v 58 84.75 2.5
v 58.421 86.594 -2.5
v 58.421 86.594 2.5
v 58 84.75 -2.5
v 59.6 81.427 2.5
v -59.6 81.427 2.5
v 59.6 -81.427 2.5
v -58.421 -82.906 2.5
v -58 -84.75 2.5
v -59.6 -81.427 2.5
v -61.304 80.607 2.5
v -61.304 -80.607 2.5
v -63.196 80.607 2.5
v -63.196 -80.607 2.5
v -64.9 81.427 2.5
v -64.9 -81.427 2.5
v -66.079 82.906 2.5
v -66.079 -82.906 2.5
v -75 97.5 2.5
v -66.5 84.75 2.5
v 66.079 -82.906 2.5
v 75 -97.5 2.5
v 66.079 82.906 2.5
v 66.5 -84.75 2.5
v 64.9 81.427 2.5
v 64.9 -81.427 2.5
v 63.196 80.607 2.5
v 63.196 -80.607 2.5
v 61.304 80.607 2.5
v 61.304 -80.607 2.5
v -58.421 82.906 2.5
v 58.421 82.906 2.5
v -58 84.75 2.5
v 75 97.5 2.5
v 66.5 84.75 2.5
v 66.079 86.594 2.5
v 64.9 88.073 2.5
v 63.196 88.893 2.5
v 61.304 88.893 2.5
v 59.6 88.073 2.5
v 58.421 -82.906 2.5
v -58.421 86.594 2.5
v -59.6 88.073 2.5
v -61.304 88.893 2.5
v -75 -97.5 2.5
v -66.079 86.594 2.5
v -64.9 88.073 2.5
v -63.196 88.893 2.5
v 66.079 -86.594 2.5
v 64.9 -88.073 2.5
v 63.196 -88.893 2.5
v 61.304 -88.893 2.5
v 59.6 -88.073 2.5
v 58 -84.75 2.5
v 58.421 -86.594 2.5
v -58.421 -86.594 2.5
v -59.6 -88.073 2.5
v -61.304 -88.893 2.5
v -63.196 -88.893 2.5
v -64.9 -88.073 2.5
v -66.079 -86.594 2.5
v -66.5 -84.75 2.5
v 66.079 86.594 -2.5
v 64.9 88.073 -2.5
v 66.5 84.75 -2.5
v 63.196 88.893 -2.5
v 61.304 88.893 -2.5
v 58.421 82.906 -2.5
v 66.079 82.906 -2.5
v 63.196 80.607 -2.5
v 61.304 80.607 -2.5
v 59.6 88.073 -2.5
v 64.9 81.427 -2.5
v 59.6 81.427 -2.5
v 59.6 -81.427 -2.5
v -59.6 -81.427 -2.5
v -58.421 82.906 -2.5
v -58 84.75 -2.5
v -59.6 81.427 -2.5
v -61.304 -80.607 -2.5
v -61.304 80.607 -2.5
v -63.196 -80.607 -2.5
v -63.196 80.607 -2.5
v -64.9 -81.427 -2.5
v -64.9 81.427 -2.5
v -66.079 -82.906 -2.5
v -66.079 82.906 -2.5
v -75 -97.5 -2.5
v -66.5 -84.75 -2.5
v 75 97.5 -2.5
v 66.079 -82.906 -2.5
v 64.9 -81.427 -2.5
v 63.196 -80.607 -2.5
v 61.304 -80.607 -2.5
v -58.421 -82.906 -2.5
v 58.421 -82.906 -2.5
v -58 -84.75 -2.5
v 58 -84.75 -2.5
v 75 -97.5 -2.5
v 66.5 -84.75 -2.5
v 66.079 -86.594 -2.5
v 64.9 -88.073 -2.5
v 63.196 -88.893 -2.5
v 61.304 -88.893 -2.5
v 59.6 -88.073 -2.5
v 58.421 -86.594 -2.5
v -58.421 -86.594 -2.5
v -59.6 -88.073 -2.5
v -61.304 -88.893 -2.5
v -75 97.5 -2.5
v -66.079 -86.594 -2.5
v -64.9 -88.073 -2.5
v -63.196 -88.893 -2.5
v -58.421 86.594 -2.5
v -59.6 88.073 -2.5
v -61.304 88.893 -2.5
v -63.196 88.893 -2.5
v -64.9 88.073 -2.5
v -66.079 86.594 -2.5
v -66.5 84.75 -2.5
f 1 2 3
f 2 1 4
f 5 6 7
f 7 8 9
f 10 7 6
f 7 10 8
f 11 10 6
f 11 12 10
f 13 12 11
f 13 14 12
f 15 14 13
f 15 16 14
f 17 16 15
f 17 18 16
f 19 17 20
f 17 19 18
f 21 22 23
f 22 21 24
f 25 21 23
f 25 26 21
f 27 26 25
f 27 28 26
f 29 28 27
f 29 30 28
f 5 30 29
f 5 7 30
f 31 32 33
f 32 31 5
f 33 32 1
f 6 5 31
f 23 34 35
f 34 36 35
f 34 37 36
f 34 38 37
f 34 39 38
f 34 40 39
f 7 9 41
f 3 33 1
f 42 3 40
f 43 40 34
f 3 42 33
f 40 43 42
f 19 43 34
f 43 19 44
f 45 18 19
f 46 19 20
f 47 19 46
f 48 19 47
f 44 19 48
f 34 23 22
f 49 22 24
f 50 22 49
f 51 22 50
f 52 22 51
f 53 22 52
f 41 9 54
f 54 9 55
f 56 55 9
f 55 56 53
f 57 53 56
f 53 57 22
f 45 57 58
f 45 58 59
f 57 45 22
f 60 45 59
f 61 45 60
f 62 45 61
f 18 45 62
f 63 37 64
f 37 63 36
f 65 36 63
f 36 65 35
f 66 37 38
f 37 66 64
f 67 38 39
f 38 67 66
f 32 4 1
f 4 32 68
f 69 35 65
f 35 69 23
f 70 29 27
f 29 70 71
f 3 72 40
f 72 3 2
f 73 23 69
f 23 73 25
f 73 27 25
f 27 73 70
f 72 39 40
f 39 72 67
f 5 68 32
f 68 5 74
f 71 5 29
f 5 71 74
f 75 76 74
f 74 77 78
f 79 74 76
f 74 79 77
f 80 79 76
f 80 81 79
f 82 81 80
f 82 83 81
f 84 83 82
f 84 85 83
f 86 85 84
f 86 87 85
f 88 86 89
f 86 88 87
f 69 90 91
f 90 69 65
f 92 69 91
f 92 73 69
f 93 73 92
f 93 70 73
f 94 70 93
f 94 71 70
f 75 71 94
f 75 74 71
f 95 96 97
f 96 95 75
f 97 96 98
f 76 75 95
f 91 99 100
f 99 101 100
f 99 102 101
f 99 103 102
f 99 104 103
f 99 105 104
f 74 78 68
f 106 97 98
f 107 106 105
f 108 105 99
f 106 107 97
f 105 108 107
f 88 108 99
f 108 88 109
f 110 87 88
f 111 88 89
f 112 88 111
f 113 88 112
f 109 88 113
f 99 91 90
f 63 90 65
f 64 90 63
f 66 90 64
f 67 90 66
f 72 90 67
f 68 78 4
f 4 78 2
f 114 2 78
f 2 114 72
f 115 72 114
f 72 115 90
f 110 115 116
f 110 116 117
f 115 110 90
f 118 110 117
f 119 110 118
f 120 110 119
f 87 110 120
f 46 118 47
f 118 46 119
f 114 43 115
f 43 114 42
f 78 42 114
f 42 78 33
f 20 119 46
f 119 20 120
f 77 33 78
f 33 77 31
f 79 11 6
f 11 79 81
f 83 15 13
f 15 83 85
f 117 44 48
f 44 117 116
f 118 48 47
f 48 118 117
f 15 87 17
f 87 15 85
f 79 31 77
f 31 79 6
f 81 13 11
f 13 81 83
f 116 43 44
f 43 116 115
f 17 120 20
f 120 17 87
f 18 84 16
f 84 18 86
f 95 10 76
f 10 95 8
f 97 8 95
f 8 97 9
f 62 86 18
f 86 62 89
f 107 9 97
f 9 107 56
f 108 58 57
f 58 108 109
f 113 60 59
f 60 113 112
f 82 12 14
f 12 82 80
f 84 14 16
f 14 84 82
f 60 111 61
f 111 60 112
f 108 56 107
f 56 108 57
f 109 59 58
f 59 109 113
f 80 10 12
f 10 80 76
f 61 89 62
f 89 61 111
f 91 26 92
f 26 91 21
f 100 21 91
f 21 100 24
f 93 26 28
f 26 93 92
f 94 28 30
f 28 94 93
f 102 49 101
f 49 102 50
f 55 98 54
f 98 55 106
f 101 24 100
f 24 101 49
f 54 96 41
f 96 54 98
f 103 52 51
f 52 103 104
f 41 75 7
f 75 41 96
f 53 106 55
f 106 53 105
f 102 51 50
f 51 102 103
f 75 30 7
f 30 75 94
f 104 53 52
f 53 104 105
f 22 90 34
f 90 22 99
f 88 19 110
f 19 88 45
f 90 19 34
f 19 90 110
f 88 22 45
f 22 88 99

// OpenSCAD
// Generated by SolidPython 1.1.3 on 2024-01-11 21:47:16


difference() {
	cube(center = true, size = [150, 195.0000000000, 5]);
	union() {
		translate(v = [62.2500000000, 84.7500000000]) {
			cylinder(center = true, h = 5, r = 4.2500000000);
		}
		translate(v = [-62.2500000000, 84.7500000000]) {
			cylinder(center = true, h = 5, r = 4.2500000000);
		}
		translate(v = [-62.2500000000, -84.7500000000]) {
			cylinder(center = true, h = 5, r = 4.2500000000);
		}
		translate(v = [62.2500000000, -84.7500000000]) {
			cylinder(center = true, h = 5, r = 4.2500000000);
		}
	}
}
/***********************************************
*********      SolidPython code:      **********
************************************************
 
import solid
import numpy as np
import numbers
import pudb
from solid.utils import *
import viewscad
import subprocess
import os
import os.path as osp
import math
import sys

chamfer_extrude=solid.import_scad("./chamfer_extrude.scad")
chamfer_extrude=chamfer_extrude.chamfer_extrude
r = viewscad.Renderer(width=800, height=800)

def debug(model,f_name,path="/home/ts/code/projects/mfd/designs/debug"):
    solid.scad_render_to_file(model,osp.join(path,f_name)+".scad")
#generate position list of wells using offset from center
wells_pos_from_center_4 = lambda offset: [[-offset,offset],
                                        [offset, offset],
                                        [-offset, -offset],
                                        [offset, -offset]]
wells_pos_from_center_2 = lambda offset: [[offset,0],
                                        [-offset,0]]

def make_well(dims,shape=None,height=None,dxf=False):
    def circle_cylinder():
        if dxf or (height is None):
            well = solid.circle(r=dims, segments=64)
        else:
            well = solid.cylinder(r=dims, h=height, segments=64, center = True)
        return well
    if dims is None:
        sys.exit("radius needs to be a number")
    if isinstance(dims, numbers.Number):
        well =circle_cylinder()
    elif len(dims)==1:
        if isinstance(dims[1], numbers.Number):
            well =circle_cylinder()
        else:
            sys.exit("radius needs to be a number")
    elif len(dims)==2:
        well = solid.square(dims,center = True)
    elif len(dims)==3:
        well = solid.cube(dims, center = True)
    return well

def wells_top_bottom(center_gap,device_dims=None,shape=None,height=None, positions = None, dxf = False,well_shape=None):
    if well_shape == None:
        well_shape = make_well(device_dims,shape=shape,height=height,dxf=dxf)
    wells = []
    if positions is None:
        offset = radius+radius/2.0
        positions = wells_pos_from_center_2(offset)
    if dxf or (height is None):
        height = 0
    for position in positions:
        if dxf:
            wells.append(solid.translate([position[0],position[1]])(well_shape))
        else:
            wells.append(solid.translate([position[0],position[1],height/2.0])(well_shape))
    return  union()(*wells)

#place wells in four corners 
def four_corner(radius,height=None, positions = None, dxf = False):
    #if well pos not specified set
    #to equally spaced by half radius
    if positions is None:
        offset = radius+radius/2.0
        positions = wells_pos_from_center_4(offset)
    if dxf or (height is None):
        height = 0
    #make wells at positions with specified radius and height
    wells = []
    for position in positions:
        #make circle if making dxf
        if dxf:
            well_shape = solid.circle(r=radius, segments=64)
            well_shape = solid.translate([position[0],position[1]])(well_shape)
        #if stl make cylinder
        else:
            well_shape = solid.cylinder(r=radius, h=height, segments=64, center = True)
            well_shape = solid.translate([position[0],position[1],height/2.0])(well_shape)
        wells.append(well_shape)
    return  union()(*wells)

#generate channels 
def make_channels(length,width,height=0,num_chans=1,max_chans=None,spacing=None, dxf = False,
                  rotate_channels=False):
    if dxf or (height is None):
        height = 0
    #if channel gap not defined, is equal to
    if spacing is None: spacing = width
    #calculate number of channels if fitting max num within given width
    if not max_chans is None:
        import math
        num_chans = math.floor((max_chans-spacing)/(width+spacing))
    #get total width of channel section  
    total_width = (width*num_chans)+(spacing*(num_chans-1))

    #make template channel
    #if rotate_channels: width, length = length, width
    if dxf:
        channel_t = solid.square([length,width],center = True)
    else:
        channel_t = solid.cube([length,width,height], center = True)

    #if number channels is even, offset the first channel to center its gap
    if num_chans % 2 == 0: centering = -(width/2.0+spacing/2.0)
    else: centering = 0
    #move template channel up to align bottom at z = 0 
    #and offset center if necessary
    if dxf:
        channel_t = solid.translate([0,centering])(channel_t)
    else:
        channel_t = solid.translate([0,centering,height/2.0])(channel_t)

    #if rotate_channels: length,width = width,length
    #start making the channels
    channels = []
    for i in range(num_chans):
        #if i=0 there is no translation
        #if i=1, we make the first channel adjacent to second
        direction = i

        #if i>=1, we add channels alternating left and right
        if i >= 1:
            direction = -(i/2.0)
            if i % 2 == 1: direction = (-direction)+0.5
                
        #make channel at right position and add it to channel list
        translation_coords = [0,direction*(width+spacing)]
        #if rotate_channels: translation_coords = [direction*(width+spacing),0]
        if dxf:
            channel = solid.translate(translation_coords)(channel_t)
        else:
            channel = solid.translate([*translation_coords,0])(channel_t)
        channels.append(channel)
    
    #group all channels as one object
    channels = union()(*channels)
    #compute the x,y,z dimensions in order to pass as arguments 
    #for construction of other parts of device (such as the chambers)
    measurements = {'x':(length/2.0,-length/2.0),
                    'y':(total_width/2.0,-total_width/2.0)}
    if not dxf:
        measurements['z'] = (height,0)
    if rotate_channels:
        channels = solid.rotate(90)(channels)
        measurements['x'],measurements['y']=measurements['y'],measurements['x']
    return channels,measurements

def make_chambers(msrs,height=None,extra=0,len_until=None,width=None, dxf = False):
    #computes x,y,z length
    total = lambda x : abs(x[0]) + abs(x[1])
    
    #if specific height if specified
    #otherwise use same height as channels
    if dxf:
        pass
    elif not height is None:
        msrs['z'] = (height,0)
    else:
        msrs['z'] = (0,0)
        
    #make copy of measurements from channels to modify chamber dimensions 
    #and add length to chambers as specified
    chamber_dims = msrs.copy()
    #calculate length of chamber to reach specified offset
    if not len_until is None:
        chamber_len = len_until-(msrs['x'][0])
    #or add specified length to channel length (if not specified, adds 0)
    else:
        chamber_len = msrs['x'][0]+extra
    #set the chamber length based 
    chamber_dims['x'] = (chamber_len/2.0,-(chamber_len/2.0))
    #compute final dimensions of chamber
    if not width is None:
        chamber_dims['y'] = (width/2.0,-width/2.0)
    chamber_dims = [total(size) for size in chamber_dims.values()]
        
    #calculate chamber translation offset to place adjacent to channels
    chamber_trslt = msrs['x'][0]+(chamber_len/2.0)
    #compute chamber translation coordinates to align with channels
    #x = 1 moves chamber above channels
    #x = -1 moves chamber below channels
    if dxf:
        trslt = lambda x : [x*(chamber_trslt),0]
    else:
        trslt = lambda x : [x*(chamber_trslt),0,msrs['z'][0]/2.0]
    
    #function to make chamber at top or at bottom 
    if dxf:
        move = lambda x : solid.translate(trslt(x))(solid.square(chamber_dims, center = True) )
    else:
        move = lambda x : solid.translate(trslt(x))(solid.cube(chamber_dims,center = True))
    #make top and bottom chambers and return them as grouped
    top = move(1)
    bottom = move(-1)
    #chambers=solid.rotate(90)(solid.union()(top,bottom))
    chambers=(solid.union()(top,bottom))

    return chambers

#create alignment features 
def alignment_features(unit,dims,grid_size, mask_size = None, alignment = "hollow", units_from_center = (2.5,2.5), corner_len=None):
    width = grid_size[0]*dims[0]
    length = grid_size[1]*dims[1]
    if mask_size is None and corner_len is None:
        corner_len = (dims[0] + dims[1]) /2 / 8
    corner = lambda thickness_div : solid.union()( solid.square([corner_len,corner_len/thickness_div],center=False), solid.square([corner_len/thickness_div,corner_len],center=False) )
    
    def make_full(thickness_div):
        thickness = corner_len/thickness_div
        tr = solid.translate([0, 0, 0 ])(solid.rotate(180)(corner(thickness_div)))
        tr = solid.translate([thickness/2,thickness/2,0])(tr)
        bl = solid.translate([0, 0, 0 ])(solid.rotate(0)(corner(thickness_div)))
        bl = solid.translate([-thickness/2,-thickness/2,0])(bl)
        return solid.union()(tr,bl)
    
    def make_hollow(thickness_div):
        thickness = corner_len/(thickness_div/2)
        inner = make_full(thickness_div)
        outer = make_full(thickness_div/2)
        hollow = outer - inner 
        return hollow
    
    center = (width /2 , length/2)
    mask_pos = lambda x,y : (center[0] + x*(float(units_from_center[0])*dims[0]), center[1] + y*(float(units_from_center[1])*dims[1]))
    positions = []
    positions.append(mask_pos(1,0))
    positions.append(mask_pos(0,1))
    positions.append(mask_pos(-1,0))
    positions.append(mask_pos(0,-1))
    make_mask = lambda mtype : make_hollow(8) if mtype == "hollow" else make_full(8)
    masks = [ solid.translate([*position,0])(make_mask(alignment)) for position in positions]
    
    solid.scad_render_to_file(solid.union()(*masks),"./designs/open_chamber/masks.scad")
    #return unit - solid.union()(*masks)
    return solid.union()(*masks,unit)

def create_outline(thickness, array, dims, grid_size,):
    width = grid_size[0]*dims[0] + thickness *2
    length = grid_size[1]*dims[1] + thickness *2
    outer = solid.translate([-thickness, -thickness,0])(solid.square([width, length]))
    return outer-array

def create_wall(wall_thickness, outline_thickness, dims, grid_size, wall_height = 2000, dxf = False):
    inner_width = grid_size[0]*dims[0] + outline_thickness *2
    inner_length = grid_size[1]*dims[1] + outline_thickness *2
    outer_width = inner_width + wall_thickness * 2
    outer_length = inner_length + wall_thickness * 2
    outer_pos_x = -outline_thickness-wall_thickness
    outer_pos_y = -outline_thickness-wall_thickness
    inner_pos_x = -outline_thickness
    inner_pos_y = -outline_thickness
    if dxf:
        inner_wall = solid.translate([inner_pos_x,
                                      inner_pos_y,
                                      0])(solid.square([inner_width, inner_length]))
        outer_wall = solid.translate([outer_pos_x,
                                      outer_pos_y,
                                      0])(solid.square([outer_width, outer_length]))

        return outer_wall-inner_wall
    else:
        inner_wall = solid.translate([inner_pos_x,
                                      inner_pos_y,
                                      0])(solid.cube([inner_width, inner_length,wall_height]))
        outer_wall = solid.translate([outer_pos_x,
                                      outer_pos_y,
                                      0])(solid.cube([outer_width, outer_length,wall_height]))

        return outer_wall-inner_wall, {'wall_height': wall_height,
                                       'wall_thickness': wall_thickness,
                                       'inner_width':inner_width,
                                       'inner_length': inner_length,
                                       'outer_width': outer_width,
                                       'outer_length': outer_length,
                                       'outer_pos_x' : outer_pos_x,
                                       'outer_pos_y' : outer_pos_y,
                                       'inner_pos_x' : inner_pos_x,
                                       'inner_pos_y' : inner_pos_y}

def create_thicker_wall(wall_thickness, outer_wall_offset, wall_dims, dims, grid_size, height_start = .2, height_end=2, dxf = False):
    addon_wall,thicker_wall_dims = create_wall(wall_thickness, outer_wall_offset, dims, grid_size, wall_height=height_end-height_start, dxf = False)
    addon_wall = solid.translate([0,0,height_start])(addon_wall)

    thicker_wall_dims['wall_height'] = height_end
    thicker_wall_dims['wall_thickness'] = wall_dims['wall_thickness'] + wall_thickness
    return addon_wall, thicker_wall_dims
 
def add_lock_to_wall(wall,wall_dims,y_offset = 0,cut_ratio=0.7,L_length=3, gap_ratio=0.05, axis="x",width_ratio=1/2):
    # Makes L shape
    def make_L(max_length,length_thickness,max_width,width_thickness,height,y_offset):
        length = solid.cube([max_length,length_thickness,height])
        width = solid.cube([width_thickness,max_width,height])
        width = solid.translate([max_length-(width_thickness),0,0])(width)
        L = solid.union()(width,length)
        debug(L,"L")
        if axis == "x":
            L = solid.rotate(-90)(L)
            L = solid.translate([0,max_length,0])(L)
        else:
            L = solid.rotate(-180)(L)
            L = solid.translate([max_length,max_width,0])(L)
        return solid.translate([0,0,y_offset])(L)
    
    lock_length = L_length
    lock_width = wall_dims['wall_thickness']*width_ratio
    lock_length_thickness = lock_width/2
    lock_width_thickness = lock_width/2
    L_lock = make_L(lock_length,lock_length_thickness,lock_width,lock_width_thickness, wall_dims['wall_height']-y_offset, y_offset)
    
    margin_space = lock_length - lock_length*(1-gap_ratio)
    key_length = lock_length-margin_space
    key_length_thickness = lock_length_thickness-(margin_space*2)
    key_width = lock_width-(margin_space*2)
    key_width_thickness = lock_width_thickness-(margin_space*2)
    L_key = make_L(key_length,key_length_thickness,key_width,key_width_thickness, wall_dims['wall_height']-y_offset, y_offset)
    L_key = solid.translate([margin_space,margin_space,0])(L_key)
    L = solid.union()(L_lock,L_key)
    debug(L,"L")
    
    #Make cube to be used as negative to split frame in a half
    #Can choose if making left or right negative, specify ratio of split
    def make_negative(right,cut_ratio):
        if axis == "x":
            if right:
                length = wall_dims['outer_length']*(1-cut_ratio)
                pos_x = wall_dims['outer_pos_x']+(wall_dims['outer_length']*cut_ratio)
            else:
                length = wall_dims['outer_length']*(cut_ratio)
                pos_x = wall_dims['outer_pos_x'] 
            negative = solid.cube([wall_dims['outer_width'],length, wall_dims['wall_height']])
            negative = solid.translate([wall_dims['outer_pos_y'],pos_x,0])(negative)
        else:
            if right:
                length = wall_dims['outer_width']*(1-cut_ratio)
                pos_x = wall_dims['outer_pos_y']+(wall_dims['outer_width']*cut_ratio)
            else:
                length = wall_dims['outer_width']*(cut_ratio)
                pos_x = wall_dims['outer_pos_y'] 
            negative = solid.cube([length,wall_dims['outer_length'], wall_dims['wall_height']])
            negative = solid.translate([pos_x,wall_dims['outer_pos_x'],0])(negative)
        return negative, pos_x, length 
                      
    #Make negatives
    negative_right, right_half_pos_x, right_half_length = make_negative(True,cut_ratio)
    negative_left, left_half_pos_x, right_half_length = make_negative(False,cut_ratio)
    #Make halves
    left_half = solid.difference()(wall,negative_right)
    right_half = solid.difference()(wall,negative_left)
    def place_L(L, L_length,L_width):
        #Place L on top wall       
        offset_to_center = (wall_dims['wall_thickness']-L_width)/2
        if axis == "x":
            y_pos_top = (wall_dims['outer_pos_y'] +
                    wall_dims['outer_width'] - 
                    L_width - offset_to_center)
            top_L = solid.translate([y_pos_top,
                                     right_half_pos_x-(L_length),
                                     0])(L)
            #Place L on bottom wall       
            y_pos_bottom = wall_dims['outer_pos_y']+offset_to_center
            bottom_L = solid.translate([y_pos_bottom,
                                        right_half_pos_x-L_length,
                                        0])(L)
        else:
            y_pos_top = (wall_dims['outer_pos_x'] +
                    wall_dims['outer_length'] -
                    (L_width+offset_to_center))
            top_L = solid.translate([right_half_pos_x-L_length,
                                     y_pos_top,
                                     0])(L)
            #Place L on bottom wall       
            y_pos_bottom = wall_dims['outer_pos_y']+offset_to_center
            bottom_L = solid.translate([right_half_pos_x-L_length,
                                        y_pos_bottom,
                                        0])(L)
        return bottom_L, top_L
    #Make complimentary L pieces through union and differences
    #Make Lock
    bottom_L_lock, top_L_lock = place_L(L_lock,L_length,lock_width)
    left_half = solid.difference()(left_half,bottom_L_lock)
    left_half = solid.difference()(left_half,top_L_lock)
    #Make Key
    bottom_L_key, top_L_key = place_L(L_key,L_length,lock_width)
    right_half = solid.union()(right_half,bottom_L_key)
    right_half = solid.union()(right_half,top_L_key)
    return left_half, right_half


#build a row x col grid of containment units
def make_unit_array(unit,dims,grid_size, dxf = False, alignment = None, mask_size = None,
                    units_from_center = None,alignment_offset=None, alignment_mark_size=1):
    units = []
    for col in range(grid_size[1]):
        for row in range(grid_size[0]):
            if dxf:
                units.append(solid.translate([row*dims[0],col*dims[1]])(unit))
            else:
                units.append(solid.translate([row*dims[0],col*dims[1],dims[2]/2.0])(unit))
    array = solid.union()(*units)
    if (not alignment is None) and dxf:
        if not alignment_offset is None:
            array = solid.translate([alignment_offset[0],alignment_offset[1]])(array)
        array = alignment_features(array,dims, grid_size, alignment = alignment, mask_size = None, units_from_center = units_from_center,corner_len=alignment_mark_size)
        if not alignment_offset is None:
            array = solid.translate([-alignment_offset[0],-alignment_offset[1]])(array)
    return array


def make_taylor(wells_pos = wells_pos_from_center_4(2.25), well_rad = 1.5 ,
                well_height = 2, chan_w = 0.01, chan_l = 1, chan_h = 0.010 ,
                chan_gap = 0.040, max_chans = None,num_chans=100, chamber_height  = 0.100,
                columns = 1, rows = 1, chamber_len_until=2.25, add_channels = True, add_wells = True, 
                add_chambers = True, save_path = "./", alignment = None, units_from_center = 2,
                mask_size = None, render_stl = False, outline_thickness = 0.050, dxf = True,
                wall_height = 15, wall_thickness = 0.95, casing_x=9, casing_y=9, casing_z=0,rotate_units=0):

    dims = [casing_x, casing_y, casing_z]
    wells = four_corner(well_rad,well_height, dxf = dxf, positions = wells_pos)
    debug(wells,"wells")
    channels, msrs = make_channels(chan_l,chan_w,chan_h,dxf=dxf, spacing = chan_gap, max_chans=max_chans,num_chans=num_chans)
    debug(channels,"channels")
    chambers = make_chambers(msrs,dxf = dxf, height=chamber_height,len_until=chamber_len_until)
    debug(chambers,"chambers")

    #add together and render
    device_parts = []
    if add_channels:
        device_parts.append(channels)
    if add_wells:
        device_parts.append(wells)
    if add_chambers:
        device_parts.append(chambers)
    device=union()(*device_parts)
    device = rotate(rotate_units)(device)

    device=solid.translate([dims[0]/2.0,dims[1]/2.0,0])(device)
    channels = rotate(rotate_units)(channels)
    channels=solid.translate([dims[0]/2,dims[1]/2,0])(channels)
    chambers_wells = union()(wells,chambers)
    chambers_wells = rotate(rotate_units)(chambers_wells)
    chambers_wells=solid.translate([dims[0]/2,dims[1]/2,0])(chambers_wells)

    file_name = str(rows)+'x'+str(columns)+'_units_'
    grid_size = [rows,columns]

    if alignment:
        alignment="full"
    device = make_unit_array(device,dims,grid_size, dxf=dxf, alignment = alignment,
                                 units_from_center = units_from_center)
    channels = make_unit_array(channels,dims,grid_size, dxf=dxf, alignment = alignment,
                                 units_from_center = units_from_center)
    if alignment=="full":
        alignment="hollow"

    chambers_wells = make_unit_array(chambers_wells,dims,grid_size, dxf=dxf, alignment = alignment,
                                 units_from_center =units_from_center)

    def save_model(model,prefix):
        model_fname = os.path.abspath(save_path+prefix+"_"+file_name+".scad")
        solid.scad_render_to_file(model,model_fname)
        return model_fname

    wells_fname = save_model(wells,"wells")
    channels_fname = save_model(channels,"channels")
    device_fname = save_model(device,"device")
    chambers_wells_fname = save_model(chambers_wells,"chambers_wells")
    return (chambers_wells,chambers_wells_fname), (channels,channels_fname), (device,device_fname)

def make_device(design='open',rows=8,columns=6,wells_pos = 4.5,well_offset=3.2, well_rad=3.2,well_height=0.1,
                chan_l=1,chan_w=0.01,chan_h=0.01,chan_gap=0.015,num_chans=101,dxf=True,save_path="./designs/open_chamber/",
                casing_x=9.0,casing_y=18.0,casing_z=0,rotate_units=90,units_from_center=(3,1),chamber_len_until=4.5,
                chamber_width=None,alignment=True, add_wells=True, add_channels=True,add_chambers=True,well_shape=None):

    dims = [casing_x, casing_y, casing_z]
    if design == "open":
        wells_pos=wells_pos_from_center_2(wells_pos)
        wells = wells_top_bottom(well_offset*2,device_dims=well_rad,height=well_height, dxf = dxf, positions = wells_pos,well_shape=well_shape)
    elif design == "closed":
        wells_pos=wells_pos_from_center_4(wells_pos)
        debug(wells,"wells")
        wells = four_corner(well_offset,well_height,device_dims=well_rad, dxf = dxf, positions = wells_pos)
    else:
        print(design+" is not a valid design.\n Choose valid design: 'open' or 'closed'")
        exit()
    wells = rotate(rotate_units)(wells)
    wells=solid.translate([dims[0]/2,dims[1]/2,0])(wells)
    debug(wells,"wells")

    channels, msrs = make_channels(chan_l,chan_w,chan_h,dxf=dxf, spacing = chan_gap, num_chans=num_chans,rotate_channels=False)
    channels = rotate(rotate_units)(channels)
    channels=solid.translate([dims[0]/2,dims[1]/2,0])(channels)

    chambers=make_chambers(msrs,height=None,extra=0,len_until=chamber_len_until, width=chamber_width,dxf = dxf)
    chambers = rotate(rotate_units)(chambers)
    chambers=solid.translate([dims[0]/2,dims[1]/2,0])(chambers)

    device_parts = []
    if add_channels:
        device_parts.append(channels)
    if add_wells:
        device_parts.append(wells)
    if add_chambers:
        device_parts.append(chambers)
    device = union()(*device_parts)
    #device = rotate(rotate_units)(device)
    #device=solid.translate([dims[0]/2.0,dims[1]/2.0,0])(device)

    chambers_wells = []
    if add_chambers:
        chambers_wells.append(chambers)
    if add_wells:
        chambers_wells.append(wells)
    chambers_wells = union()(*chambers_wells)
    #chambers_wells = union()(wells,chambers)
    #chambers_wells = rotate(rotate_units)(chambers_wells)
    #chambers_wells=solid.translate([dims[0]/2,dims[1]/2,0])(chambers_wells)

    file_name = str(rows)+'x'+str(columns)+'_units_'

    grid_size = [rows,columns]
    if alignment:
        alignment="full"
    device = make_unit_array(device,dims,grid_size, dxf=dxf, alignment = alignment,
                                 units_from_center = units_from_center)
    channels = make_unit_array(channels,dims,grid_size, dxf=dxf, alignment = alignment,
                                 units_from_center = units_from_center)
    if alignment=="full":
        alignment="hollow"

    chambers_wells = make_unit_array(chambers_wells,dims,grid_size, dxf=dxf, alignment = alignment,
                                 units_from_center =units_from_center)

    def save_model(model,prefix):
        model_fname = os.path.abspath(save_path+prefix+"_"+file_name+".scad")
        solid.scad_render_to_file(model,model_fname)
        return model_fname

    wells_fname = save_model(wells,"wells")
    channels_fname = save_model(channels,"channels")
    device_fname = save_model(device,"device")
    chambers_wells_fname = save_model(chambers_wells,"chambers_wells")
    return (chambers_wells,chambers_wells_fname), (channels,channels_fname), (device,device_fname)


def make_open_chamber(rows=8,columns=6,wells_pos = wells_pos_from_center_2(4.5), well_rad=3.2,well_height=0.1,
                      chan_l=1,chan_w=0.01,chan_h=0.01,chan_gap=0.015,num_chans=101,dxf=True,save_path="./designs/open_chamber/",
                      casing_x=9.0,casing_y=18.0,casing_z=0,rotate_units=90,units_from_center=(3,1),chamber_len_until=4.5,
                      chamber_width=None,alignment=True, add_wells=True, add_channels=True,add_chambers=True,well_shape=None):

    dims = [casing_x, casing_y, casing_z]
    wells = wells_top_bottom(well_rad,height=well_height, dxf = dxf, positions = wells_pos, well_shape=well_shape)
    channels, msrs = make_channels(chan_l,chan_w,chan_h,dxf=dxf, spacing = chan_gap, num_chans=num_chans,rotate_channels=False)
    chambers=make_chambers(msrs,height=None,extra=0,len_until=chamber_len_until, width=chamber_width,dxf = dxf)
    debug(chambers,"chambers")
    device_parts = []
    if add_channels:
        device_parts.append(channels)
    if add_wells:
        device_parts.append(wells)
    if add_chambers:
        device_parts.append(chambers)
    device = union()(*device_parts)
    device = rotate(rotate_units)(device)
    device=solid.translate([dims[0]/2.0,dims[1]/2.0,0])(device)
    channels = rotate(rotate_units)(channels)
    channels=solid.translate([dims[0]/2,dims[1]/2,0])(channels)
    chambers_wells = union()(wells,chambers)
    chambers_wells = rotate(rotate_units)(chambers_wells)
    chambers_wells=solid.translate([dims[0]/2,dims[1]/2,0])(chambers_wells)

    file_name = str(rows)+'x'+str(columns)+'_units_'

    grid_size = [rows,columns]
    if alignment:
        alignment="full"
    device = make_unit_array(device,dims,grid_size, dxf=dxf, alignment = alignment,
                                 units_from_center = units_from_center)
    channels = make_unit_array(channels,dims,grid_size, dxf=dxf, alignment = alignment,
                                 units_from_center = units_from_center)
    if alignment=="full":
        alignment="hollow"

    chambers_wells = make_unit_array(chambers_wells,dims,grid_size, dxf=dxf, alignment = alignment,
                                 units_from_center =units_from_center)

    def save_model(model,prefix):
        model_fname = os.path.abspath(save_path+prefix+"_"+file_name+".scad")
        solid.scad_render_to_file(model,model_fname)
        return model_fname

    wells_fname = save_model(wells,"wells")
    channels_fname = save_model(channels,"channels")
    device_fname = save_model(device,"device")
    chambers_wells_fname = save_model(chambers_wells,"chambers_wells")
    return (chambers_wells,chambers_wells_fname), (channels,channels_fname), (device,device_fname)

def to_dxf(scad_path):
    dxf_path = scad_path.replace(".scad",".dxf")
    subprocess.call(["openscad", "-o", dxf_path, scad_path])
    import ezdxf
    temp_dxf = ezdxf.readfile(dxf_path)
    temp_dxf.saveas(dxf_path)

#def make_walls(diameter,thickness,grid_size,dims,height=20,segments=256,make_inner=True):
#    wafer_wall_out = solid.cylinder(r=diameter/2,h=height, segments=segments)
#    wafer_wall_in = solid.cylinder(r=(diameter/2-thickness),h=height, segments=segments)
#    wafer_wall = solid.difference()(wafer_wall_out,wafer_wall_in)
#    wafer_wall = solid.translate([grid_size[1]*dims[1]/2.0,grid_size[0]*dims[0]/2.0])(wafer_wall)
#
#    vertical_wall_length = grid_size[1]*dims[1]
#    horizontal_wall_length = grid_size[0]*dims[0]
#    vertical_wall = solid.cube([vertical_wall_length,thickness,height],center = True)
#    vertical_wall = solid.translate([vertical_wall_length/2,0,height/2])(vertical_wall)
#    horizontal_wall = solid.cube([thickness,horizontal_wall_length,height],center = True)
#    horizontal_wall = solid.translate([0,vertical_wall_length/2,height/2])(horizontal_wall)
#    walls = []
#    walls.append(horizontal_wall)
#    walls.append(vertical_wall)
#    for col in range(grid_size[1]):
#        if col == grid_size[1]-1: 
#            walls.append(solid.translate([0,(col+1)*dims[1]])(vertical_wall))
#        elif col > 0 and col < grid_size[1]-1 and make_inner==True:
#            walls.append(solid.translate([0,(col+1)*dims[1]])(vertical_wall))
#    for row in range(grid_size[0]):
#        if row == grid_size[0]-1: 
#            walls.append(solid.translate([(row+1)*dims[0],0])(horizontal_wall))
#        elif row > 0 and row < grid_size[0]-1 and make_inner==True:
#            walls.append(solid.translate([(row+1)*dims[0],0])(horizontal_wall))
#    walls = union()(*walls)
#    wafer_walls = union()(walls,wafer_wall)
#    return walls,wafer_wall,wafer_walls

def make_walls(diameter,thickness,grid_size,dims,height=20,segments=256,make_inner=True,padx=0,pady=0):
    wafer_wall_out = solid.cylinder(r=diameter/2,h=height, segments=segments)
    wafer_wall_in = solid.cylinder(r=(diameter/2-thickness),h=height, segments=segments)
    wafer_wall = solid.difference()(wafer_wall_out,wafer_wall_in)
    wafer_wall = solid.translate([grid_size[1]*dims[1]/2.0,grid_size[0]*dims[0]/2.0])(wafer_wall)

    vertical_wall_length = grid_size[0]*dims[0]+padx
    horizontal_wall_length = grid_size[1]*dims[1]+pady
    vertical_wall = solid.cube([vertical_wall_length,thickness,height],center = True)
    vertical_wall = solid.translate([vertical_wall_length/2-pady/2,-padx/2,height/2])(vertical_wall)
    horizontal_wall = solid.cube([thickness,horizontal_wall_length,height],center = True)
    horizontal_wall = solid.translate([-pady/2,horizontal_wall_length/2-padx/2,height/2])(horizontal_wall)
    walls = []
    walls.append(horizontal_wall)
    walls.append(vertical_wall)
    for col in range(grid_size[1]):
        if col == grid_size[1]-1: 
            walls.append(solid.translate([0,(col+1)*dims[1]+pady])(vertical_wall))
        elif col > 0 and col < grid_size[1]-1 and make_inner==True:
            walls.append(solid.translate([0,(col+1)*dims[1]])(vertical_wall))
    for row in range(grid_size[0]):
        if row == grid_size[0]-1: 
            walls.append(solid.translate([(row+1)*dims[0]+padx,0])(horizontal_wall))
        elif row > 0 and row < grid_size[0]-1 and make_inner==True:
            walls.append(solid.translate([(row+1)*dims[0],0])(horizontal_wall))
    walls = union()(*walls)
    wafer_walls = union()(walls,wafer_wall)
    return walls,wafer_wall,wafer_walls

def save_model(model,base_path,base_name,dxf=True):
    if not os.path.exists(base_path):
        os.makedirs(base_path)
    dxf_path=osp.join(base_path,base_name+".scad")
    solid.scad_render_to_file(model,osp.join(dxf_path))
    if dxf:
        to_dxf(dxf_path)

def make_wafer(diameter,flat_len,thickness):
    wafer = solid.cylinder(r1=diameter/2,r2=diameter/2,h=thickness,segments=512,)()
    x_start_flat=(flat_len/2)
    y_start_flat = math.sqrt(((diameter/2)**2) - (x_start_flat**2) )
    height_delete_flat=diameter/2-y_start_flat
    flat_delete = solid.cube([flat_len,height_delete_flat,thickness],center=False)()
    flat_delete = solid.translate([-flat_len/2,y_start_flat,0])(flat_delete)
    wafer = solid.difference()(wafer,flat_delete)
    wafer = solid.rotate(90)(wafer)
    return wafer

def add_wafer_to_mask(wafer_size,flat_len,mask,grid_size,dims,wafer_line_thickness=0.1,outer_mask_thickness=5,alignment_offset=None):
    def make_wafer_mask(wafer_size,flat_len):
        wafer_mask = make_wafer(wafer_size,flat_len,1)
        wafer_mask = solid.projection()(wafer_mask)
        wafer_mask = solid.translate([grid_size[0]*dims[0]/2.0,grid_size[1]*dims[1]/2.0])(wafer_mask)
        if not alignment_offset is None:
            wafer_mask = solid.translate([-alignment_offset[0],-alignment_offset[1]])(wafer_mask)
        return wafer_mask

    inner_wafer_line_mask = make_wafer_mask(wafer_size-wafer_line_thickness/2,flat_len)
    outer_wafer_line_mask = make_wafer_mask(wafer_size+wafer_line_thickness/2,flat_len)
    outer_wafer_mask = make_wafer_mask(wafer_size+outer_mask_thickness,flat_len)
    outer_wafer_mask = solid.difference()(outer_wafer_mask,outer_wafer_line_mask)
    wafer_mask = solid.union()(outer_wafer_mask,inner_wafer_line_mask)

    return solid.difference()(wafer_mask,mask)

def make_posts(post_shape,post_height):
    posts = solid.linear_extrude(height=post_height)(post_shape)
    return posts

def make_wafer_empty(diameter,flat_len,thickness,margin,notch_len=20,notch_height=5,oversize=1.01):
    diameter*=oversize
    flat_len*=oversize
    wafer = make_wafer(diameter,flat_len,thickness)
    holder = solid.cylinder(r1=diameter/2+margin,r2=diameter/2+margin,h=thickness,segments=512)()
    holder = solid.difference()(holder,wafer)

    x_start_flat=(flat_len/2)
    y_start_flat = math.sqrt(((diameter/2)**2) - (x_start_flat**2) )
    height_delete_flat=diameter/2-y_start_flat
    notch = solid.cube([notch_len,notch_height,thickness],center=False)()
    notch = solid.translate([-notch_len/2,y_start_flat,0])(notch)
    notch = solid.rotate(90)(notch)
    return solid.difference()(holder,notch)

def wafer_print_calibration(diameter,thickness,height,z_offset):
    circles = []
    radii = []
    radii.append(diameter/2.0*0.8)
    radii.append(diameter/2.0*0.6)
    radii.append(diameter/2.0*0.4)
    radii.append(diameter/2.0*0.2)
    for radius in radii:
        inner = solid.cylinder(r1=radius-(thickness/2.0),r2=radius-(thickness/2.0),h=thickness,segments=512,)()
        outer = solid.cylinder(r1=radius+(thickness/2.0),r2=radius+(thickness/2.0),h=thickness,segments=512,)()
        diff = solid.difference()(outer,inner)
        circles.append(diff)
    circles = solid.union()(*circles)
    circles = solid.translate([0,0,z_offset])(circles)
    return circles

def make_rack(wells,dims,grid_size,alignment_offset,rack_x,rack_y,rack_thickness,bolt_width,add_bolts=True):

    #get X and Y dimensions of gride of pipette tips
    X_len = dims[0]*grid_size[0]
    Y_len = dims[1]*grid_size[1]
    #make rack
    rack = solid.cube([rack_x,rack_y,rack_thickness],center=True)

    if add_bolts:
    #add bolt holes
        bolt_hole=solid.cylinder(r=bolt_width/2,h=rack_thickness,center=True)()
        bolt_holes = []
        bolt_holes.append(solid.translate([rack_x/2-1.5*bolt_width,rack_y/2-1.5*bolt_width])(bolt_hole))
        bolt_holes.append(solid.translate([-rack_x/2+1.5*bolt_width,rack_y/2-1.5*bolt_width])(bolt_hole))
        bolt_holes.append(solid.translate([-rack_x/2+1.5*bolt_width,-rack_y/2+1.5*bolt_width])(bolt_hole))
        bolt_holes.append(solid.translate([rack_x/2-1.5*bolt_width,-rack_y/2+1.5*bolt_width])(bolt_hole))
        bolt_holes = solid.union()(*bolt_holes)
        rack=solid.difference()(rack,bolt_holes)
    rack_support = rack

    #center rack with pipette holes
    rack = solid.translate([0,0,rack_thickness/2])(rack)
    rack = solid.translate([X_len/2,Y_len/2])(rack)
    rack = solid.translate([-alignment_offset[0],-alignment_offset[1]])(rack)
    wells = solid.linear_extrude(height=rack_thickness)(wells)
    rack = solid.difference()(rack,wells)
    return rack, rack_support

def make_pillar(wells,dims,grid_size,alignment_offset,rack_x,rack_y,pillar_height,rack_thickness,bolt_width,add_bolts=True,taper_angle=1,bolt_position_corner=1.5):

    #get X and Y dimensions of gride of pipette tips
    X_len = dims[0]*grid_size[0]
    Y_len = dims[1]*grid_size[1]
    #make rack
    rack = solid.cube([rack_x,rack_y,rack_thickness],center=True)
    
    if add_bolts:
    #add bolt holes
        bolt_hole=solid.cylinder(r=bolt_width/2,h=rack_thickness,center=True)()
        bolt_holes = []
        bolt_holes.append(solid.translate([rack_x/2-bolt_position_corner*bolt_width,rack_y/2-bolt_position_corner*bolt_width])(bolt_hole))
        bolt_holes.append(solid.translate([-rack_x/2+bolt_position_corner*bolt_width,rack_y/2-bolt_position_corner*bolt_width])(bolt_hole))
        bolt_holes.append(solid.translate([-rack_x/2+bolt_position_corner*bolt_width,-rack_y/2+bolt_position_corner*bolt_width])(bolt_hole))
        bolt_holes.append(solid.translate([rack_x/2-bolt_position_corner*bolt_width,-rack_y/2+bolt_position_corner*bolt_width])(bolt_hole))
        bolt_holes = solid.union()(*bolt_holes)
        rack=solid.difference()(rack,bolt_holes)
    rack_support = rack

    #center rack with pipette holes
    #rack = solid.translate([0,0,-rack_thickness])(rack)
    rack = solid.translate([X_len/2,Y_len/2])(rack)
    rack = solid.translate([-alignment_offset[0],-alignment_offset[1]])(rack)
    if not taper_angle == 0:
        wells=chamfer_extrude(pillar_height,taper_angle,segments=20)(wells)
    else:
        wells = solid.linear_extrude(height=pillar_height)(wells)
    rack = solid.union()(rack,wells)
    return rack, rack_support

def deg_taper_len(height,deg):
    if not deg == 0:
        return height*math.tan(math.radians(deg))
    else:
        return 0

def make_outline(inner_dims,wall_thickness,grid_size,dims,alignment_offset):
    inner_dims=np.array(inner_dims)
    inner_outline=solid.square(inner_dims,center=True)
    outer_dims=inner_dims+wall_thickness
    outer_outline=solid.square(outer_dims,center=True)
    outline=solid.difference()(outer_outline,inner_outline)
    outline=solid.translate([grid_size[0]*dims[0]/2.0,grid_size[1]*dims[1]/2.0])(outline)
    return outline








 
 
************************************************/
